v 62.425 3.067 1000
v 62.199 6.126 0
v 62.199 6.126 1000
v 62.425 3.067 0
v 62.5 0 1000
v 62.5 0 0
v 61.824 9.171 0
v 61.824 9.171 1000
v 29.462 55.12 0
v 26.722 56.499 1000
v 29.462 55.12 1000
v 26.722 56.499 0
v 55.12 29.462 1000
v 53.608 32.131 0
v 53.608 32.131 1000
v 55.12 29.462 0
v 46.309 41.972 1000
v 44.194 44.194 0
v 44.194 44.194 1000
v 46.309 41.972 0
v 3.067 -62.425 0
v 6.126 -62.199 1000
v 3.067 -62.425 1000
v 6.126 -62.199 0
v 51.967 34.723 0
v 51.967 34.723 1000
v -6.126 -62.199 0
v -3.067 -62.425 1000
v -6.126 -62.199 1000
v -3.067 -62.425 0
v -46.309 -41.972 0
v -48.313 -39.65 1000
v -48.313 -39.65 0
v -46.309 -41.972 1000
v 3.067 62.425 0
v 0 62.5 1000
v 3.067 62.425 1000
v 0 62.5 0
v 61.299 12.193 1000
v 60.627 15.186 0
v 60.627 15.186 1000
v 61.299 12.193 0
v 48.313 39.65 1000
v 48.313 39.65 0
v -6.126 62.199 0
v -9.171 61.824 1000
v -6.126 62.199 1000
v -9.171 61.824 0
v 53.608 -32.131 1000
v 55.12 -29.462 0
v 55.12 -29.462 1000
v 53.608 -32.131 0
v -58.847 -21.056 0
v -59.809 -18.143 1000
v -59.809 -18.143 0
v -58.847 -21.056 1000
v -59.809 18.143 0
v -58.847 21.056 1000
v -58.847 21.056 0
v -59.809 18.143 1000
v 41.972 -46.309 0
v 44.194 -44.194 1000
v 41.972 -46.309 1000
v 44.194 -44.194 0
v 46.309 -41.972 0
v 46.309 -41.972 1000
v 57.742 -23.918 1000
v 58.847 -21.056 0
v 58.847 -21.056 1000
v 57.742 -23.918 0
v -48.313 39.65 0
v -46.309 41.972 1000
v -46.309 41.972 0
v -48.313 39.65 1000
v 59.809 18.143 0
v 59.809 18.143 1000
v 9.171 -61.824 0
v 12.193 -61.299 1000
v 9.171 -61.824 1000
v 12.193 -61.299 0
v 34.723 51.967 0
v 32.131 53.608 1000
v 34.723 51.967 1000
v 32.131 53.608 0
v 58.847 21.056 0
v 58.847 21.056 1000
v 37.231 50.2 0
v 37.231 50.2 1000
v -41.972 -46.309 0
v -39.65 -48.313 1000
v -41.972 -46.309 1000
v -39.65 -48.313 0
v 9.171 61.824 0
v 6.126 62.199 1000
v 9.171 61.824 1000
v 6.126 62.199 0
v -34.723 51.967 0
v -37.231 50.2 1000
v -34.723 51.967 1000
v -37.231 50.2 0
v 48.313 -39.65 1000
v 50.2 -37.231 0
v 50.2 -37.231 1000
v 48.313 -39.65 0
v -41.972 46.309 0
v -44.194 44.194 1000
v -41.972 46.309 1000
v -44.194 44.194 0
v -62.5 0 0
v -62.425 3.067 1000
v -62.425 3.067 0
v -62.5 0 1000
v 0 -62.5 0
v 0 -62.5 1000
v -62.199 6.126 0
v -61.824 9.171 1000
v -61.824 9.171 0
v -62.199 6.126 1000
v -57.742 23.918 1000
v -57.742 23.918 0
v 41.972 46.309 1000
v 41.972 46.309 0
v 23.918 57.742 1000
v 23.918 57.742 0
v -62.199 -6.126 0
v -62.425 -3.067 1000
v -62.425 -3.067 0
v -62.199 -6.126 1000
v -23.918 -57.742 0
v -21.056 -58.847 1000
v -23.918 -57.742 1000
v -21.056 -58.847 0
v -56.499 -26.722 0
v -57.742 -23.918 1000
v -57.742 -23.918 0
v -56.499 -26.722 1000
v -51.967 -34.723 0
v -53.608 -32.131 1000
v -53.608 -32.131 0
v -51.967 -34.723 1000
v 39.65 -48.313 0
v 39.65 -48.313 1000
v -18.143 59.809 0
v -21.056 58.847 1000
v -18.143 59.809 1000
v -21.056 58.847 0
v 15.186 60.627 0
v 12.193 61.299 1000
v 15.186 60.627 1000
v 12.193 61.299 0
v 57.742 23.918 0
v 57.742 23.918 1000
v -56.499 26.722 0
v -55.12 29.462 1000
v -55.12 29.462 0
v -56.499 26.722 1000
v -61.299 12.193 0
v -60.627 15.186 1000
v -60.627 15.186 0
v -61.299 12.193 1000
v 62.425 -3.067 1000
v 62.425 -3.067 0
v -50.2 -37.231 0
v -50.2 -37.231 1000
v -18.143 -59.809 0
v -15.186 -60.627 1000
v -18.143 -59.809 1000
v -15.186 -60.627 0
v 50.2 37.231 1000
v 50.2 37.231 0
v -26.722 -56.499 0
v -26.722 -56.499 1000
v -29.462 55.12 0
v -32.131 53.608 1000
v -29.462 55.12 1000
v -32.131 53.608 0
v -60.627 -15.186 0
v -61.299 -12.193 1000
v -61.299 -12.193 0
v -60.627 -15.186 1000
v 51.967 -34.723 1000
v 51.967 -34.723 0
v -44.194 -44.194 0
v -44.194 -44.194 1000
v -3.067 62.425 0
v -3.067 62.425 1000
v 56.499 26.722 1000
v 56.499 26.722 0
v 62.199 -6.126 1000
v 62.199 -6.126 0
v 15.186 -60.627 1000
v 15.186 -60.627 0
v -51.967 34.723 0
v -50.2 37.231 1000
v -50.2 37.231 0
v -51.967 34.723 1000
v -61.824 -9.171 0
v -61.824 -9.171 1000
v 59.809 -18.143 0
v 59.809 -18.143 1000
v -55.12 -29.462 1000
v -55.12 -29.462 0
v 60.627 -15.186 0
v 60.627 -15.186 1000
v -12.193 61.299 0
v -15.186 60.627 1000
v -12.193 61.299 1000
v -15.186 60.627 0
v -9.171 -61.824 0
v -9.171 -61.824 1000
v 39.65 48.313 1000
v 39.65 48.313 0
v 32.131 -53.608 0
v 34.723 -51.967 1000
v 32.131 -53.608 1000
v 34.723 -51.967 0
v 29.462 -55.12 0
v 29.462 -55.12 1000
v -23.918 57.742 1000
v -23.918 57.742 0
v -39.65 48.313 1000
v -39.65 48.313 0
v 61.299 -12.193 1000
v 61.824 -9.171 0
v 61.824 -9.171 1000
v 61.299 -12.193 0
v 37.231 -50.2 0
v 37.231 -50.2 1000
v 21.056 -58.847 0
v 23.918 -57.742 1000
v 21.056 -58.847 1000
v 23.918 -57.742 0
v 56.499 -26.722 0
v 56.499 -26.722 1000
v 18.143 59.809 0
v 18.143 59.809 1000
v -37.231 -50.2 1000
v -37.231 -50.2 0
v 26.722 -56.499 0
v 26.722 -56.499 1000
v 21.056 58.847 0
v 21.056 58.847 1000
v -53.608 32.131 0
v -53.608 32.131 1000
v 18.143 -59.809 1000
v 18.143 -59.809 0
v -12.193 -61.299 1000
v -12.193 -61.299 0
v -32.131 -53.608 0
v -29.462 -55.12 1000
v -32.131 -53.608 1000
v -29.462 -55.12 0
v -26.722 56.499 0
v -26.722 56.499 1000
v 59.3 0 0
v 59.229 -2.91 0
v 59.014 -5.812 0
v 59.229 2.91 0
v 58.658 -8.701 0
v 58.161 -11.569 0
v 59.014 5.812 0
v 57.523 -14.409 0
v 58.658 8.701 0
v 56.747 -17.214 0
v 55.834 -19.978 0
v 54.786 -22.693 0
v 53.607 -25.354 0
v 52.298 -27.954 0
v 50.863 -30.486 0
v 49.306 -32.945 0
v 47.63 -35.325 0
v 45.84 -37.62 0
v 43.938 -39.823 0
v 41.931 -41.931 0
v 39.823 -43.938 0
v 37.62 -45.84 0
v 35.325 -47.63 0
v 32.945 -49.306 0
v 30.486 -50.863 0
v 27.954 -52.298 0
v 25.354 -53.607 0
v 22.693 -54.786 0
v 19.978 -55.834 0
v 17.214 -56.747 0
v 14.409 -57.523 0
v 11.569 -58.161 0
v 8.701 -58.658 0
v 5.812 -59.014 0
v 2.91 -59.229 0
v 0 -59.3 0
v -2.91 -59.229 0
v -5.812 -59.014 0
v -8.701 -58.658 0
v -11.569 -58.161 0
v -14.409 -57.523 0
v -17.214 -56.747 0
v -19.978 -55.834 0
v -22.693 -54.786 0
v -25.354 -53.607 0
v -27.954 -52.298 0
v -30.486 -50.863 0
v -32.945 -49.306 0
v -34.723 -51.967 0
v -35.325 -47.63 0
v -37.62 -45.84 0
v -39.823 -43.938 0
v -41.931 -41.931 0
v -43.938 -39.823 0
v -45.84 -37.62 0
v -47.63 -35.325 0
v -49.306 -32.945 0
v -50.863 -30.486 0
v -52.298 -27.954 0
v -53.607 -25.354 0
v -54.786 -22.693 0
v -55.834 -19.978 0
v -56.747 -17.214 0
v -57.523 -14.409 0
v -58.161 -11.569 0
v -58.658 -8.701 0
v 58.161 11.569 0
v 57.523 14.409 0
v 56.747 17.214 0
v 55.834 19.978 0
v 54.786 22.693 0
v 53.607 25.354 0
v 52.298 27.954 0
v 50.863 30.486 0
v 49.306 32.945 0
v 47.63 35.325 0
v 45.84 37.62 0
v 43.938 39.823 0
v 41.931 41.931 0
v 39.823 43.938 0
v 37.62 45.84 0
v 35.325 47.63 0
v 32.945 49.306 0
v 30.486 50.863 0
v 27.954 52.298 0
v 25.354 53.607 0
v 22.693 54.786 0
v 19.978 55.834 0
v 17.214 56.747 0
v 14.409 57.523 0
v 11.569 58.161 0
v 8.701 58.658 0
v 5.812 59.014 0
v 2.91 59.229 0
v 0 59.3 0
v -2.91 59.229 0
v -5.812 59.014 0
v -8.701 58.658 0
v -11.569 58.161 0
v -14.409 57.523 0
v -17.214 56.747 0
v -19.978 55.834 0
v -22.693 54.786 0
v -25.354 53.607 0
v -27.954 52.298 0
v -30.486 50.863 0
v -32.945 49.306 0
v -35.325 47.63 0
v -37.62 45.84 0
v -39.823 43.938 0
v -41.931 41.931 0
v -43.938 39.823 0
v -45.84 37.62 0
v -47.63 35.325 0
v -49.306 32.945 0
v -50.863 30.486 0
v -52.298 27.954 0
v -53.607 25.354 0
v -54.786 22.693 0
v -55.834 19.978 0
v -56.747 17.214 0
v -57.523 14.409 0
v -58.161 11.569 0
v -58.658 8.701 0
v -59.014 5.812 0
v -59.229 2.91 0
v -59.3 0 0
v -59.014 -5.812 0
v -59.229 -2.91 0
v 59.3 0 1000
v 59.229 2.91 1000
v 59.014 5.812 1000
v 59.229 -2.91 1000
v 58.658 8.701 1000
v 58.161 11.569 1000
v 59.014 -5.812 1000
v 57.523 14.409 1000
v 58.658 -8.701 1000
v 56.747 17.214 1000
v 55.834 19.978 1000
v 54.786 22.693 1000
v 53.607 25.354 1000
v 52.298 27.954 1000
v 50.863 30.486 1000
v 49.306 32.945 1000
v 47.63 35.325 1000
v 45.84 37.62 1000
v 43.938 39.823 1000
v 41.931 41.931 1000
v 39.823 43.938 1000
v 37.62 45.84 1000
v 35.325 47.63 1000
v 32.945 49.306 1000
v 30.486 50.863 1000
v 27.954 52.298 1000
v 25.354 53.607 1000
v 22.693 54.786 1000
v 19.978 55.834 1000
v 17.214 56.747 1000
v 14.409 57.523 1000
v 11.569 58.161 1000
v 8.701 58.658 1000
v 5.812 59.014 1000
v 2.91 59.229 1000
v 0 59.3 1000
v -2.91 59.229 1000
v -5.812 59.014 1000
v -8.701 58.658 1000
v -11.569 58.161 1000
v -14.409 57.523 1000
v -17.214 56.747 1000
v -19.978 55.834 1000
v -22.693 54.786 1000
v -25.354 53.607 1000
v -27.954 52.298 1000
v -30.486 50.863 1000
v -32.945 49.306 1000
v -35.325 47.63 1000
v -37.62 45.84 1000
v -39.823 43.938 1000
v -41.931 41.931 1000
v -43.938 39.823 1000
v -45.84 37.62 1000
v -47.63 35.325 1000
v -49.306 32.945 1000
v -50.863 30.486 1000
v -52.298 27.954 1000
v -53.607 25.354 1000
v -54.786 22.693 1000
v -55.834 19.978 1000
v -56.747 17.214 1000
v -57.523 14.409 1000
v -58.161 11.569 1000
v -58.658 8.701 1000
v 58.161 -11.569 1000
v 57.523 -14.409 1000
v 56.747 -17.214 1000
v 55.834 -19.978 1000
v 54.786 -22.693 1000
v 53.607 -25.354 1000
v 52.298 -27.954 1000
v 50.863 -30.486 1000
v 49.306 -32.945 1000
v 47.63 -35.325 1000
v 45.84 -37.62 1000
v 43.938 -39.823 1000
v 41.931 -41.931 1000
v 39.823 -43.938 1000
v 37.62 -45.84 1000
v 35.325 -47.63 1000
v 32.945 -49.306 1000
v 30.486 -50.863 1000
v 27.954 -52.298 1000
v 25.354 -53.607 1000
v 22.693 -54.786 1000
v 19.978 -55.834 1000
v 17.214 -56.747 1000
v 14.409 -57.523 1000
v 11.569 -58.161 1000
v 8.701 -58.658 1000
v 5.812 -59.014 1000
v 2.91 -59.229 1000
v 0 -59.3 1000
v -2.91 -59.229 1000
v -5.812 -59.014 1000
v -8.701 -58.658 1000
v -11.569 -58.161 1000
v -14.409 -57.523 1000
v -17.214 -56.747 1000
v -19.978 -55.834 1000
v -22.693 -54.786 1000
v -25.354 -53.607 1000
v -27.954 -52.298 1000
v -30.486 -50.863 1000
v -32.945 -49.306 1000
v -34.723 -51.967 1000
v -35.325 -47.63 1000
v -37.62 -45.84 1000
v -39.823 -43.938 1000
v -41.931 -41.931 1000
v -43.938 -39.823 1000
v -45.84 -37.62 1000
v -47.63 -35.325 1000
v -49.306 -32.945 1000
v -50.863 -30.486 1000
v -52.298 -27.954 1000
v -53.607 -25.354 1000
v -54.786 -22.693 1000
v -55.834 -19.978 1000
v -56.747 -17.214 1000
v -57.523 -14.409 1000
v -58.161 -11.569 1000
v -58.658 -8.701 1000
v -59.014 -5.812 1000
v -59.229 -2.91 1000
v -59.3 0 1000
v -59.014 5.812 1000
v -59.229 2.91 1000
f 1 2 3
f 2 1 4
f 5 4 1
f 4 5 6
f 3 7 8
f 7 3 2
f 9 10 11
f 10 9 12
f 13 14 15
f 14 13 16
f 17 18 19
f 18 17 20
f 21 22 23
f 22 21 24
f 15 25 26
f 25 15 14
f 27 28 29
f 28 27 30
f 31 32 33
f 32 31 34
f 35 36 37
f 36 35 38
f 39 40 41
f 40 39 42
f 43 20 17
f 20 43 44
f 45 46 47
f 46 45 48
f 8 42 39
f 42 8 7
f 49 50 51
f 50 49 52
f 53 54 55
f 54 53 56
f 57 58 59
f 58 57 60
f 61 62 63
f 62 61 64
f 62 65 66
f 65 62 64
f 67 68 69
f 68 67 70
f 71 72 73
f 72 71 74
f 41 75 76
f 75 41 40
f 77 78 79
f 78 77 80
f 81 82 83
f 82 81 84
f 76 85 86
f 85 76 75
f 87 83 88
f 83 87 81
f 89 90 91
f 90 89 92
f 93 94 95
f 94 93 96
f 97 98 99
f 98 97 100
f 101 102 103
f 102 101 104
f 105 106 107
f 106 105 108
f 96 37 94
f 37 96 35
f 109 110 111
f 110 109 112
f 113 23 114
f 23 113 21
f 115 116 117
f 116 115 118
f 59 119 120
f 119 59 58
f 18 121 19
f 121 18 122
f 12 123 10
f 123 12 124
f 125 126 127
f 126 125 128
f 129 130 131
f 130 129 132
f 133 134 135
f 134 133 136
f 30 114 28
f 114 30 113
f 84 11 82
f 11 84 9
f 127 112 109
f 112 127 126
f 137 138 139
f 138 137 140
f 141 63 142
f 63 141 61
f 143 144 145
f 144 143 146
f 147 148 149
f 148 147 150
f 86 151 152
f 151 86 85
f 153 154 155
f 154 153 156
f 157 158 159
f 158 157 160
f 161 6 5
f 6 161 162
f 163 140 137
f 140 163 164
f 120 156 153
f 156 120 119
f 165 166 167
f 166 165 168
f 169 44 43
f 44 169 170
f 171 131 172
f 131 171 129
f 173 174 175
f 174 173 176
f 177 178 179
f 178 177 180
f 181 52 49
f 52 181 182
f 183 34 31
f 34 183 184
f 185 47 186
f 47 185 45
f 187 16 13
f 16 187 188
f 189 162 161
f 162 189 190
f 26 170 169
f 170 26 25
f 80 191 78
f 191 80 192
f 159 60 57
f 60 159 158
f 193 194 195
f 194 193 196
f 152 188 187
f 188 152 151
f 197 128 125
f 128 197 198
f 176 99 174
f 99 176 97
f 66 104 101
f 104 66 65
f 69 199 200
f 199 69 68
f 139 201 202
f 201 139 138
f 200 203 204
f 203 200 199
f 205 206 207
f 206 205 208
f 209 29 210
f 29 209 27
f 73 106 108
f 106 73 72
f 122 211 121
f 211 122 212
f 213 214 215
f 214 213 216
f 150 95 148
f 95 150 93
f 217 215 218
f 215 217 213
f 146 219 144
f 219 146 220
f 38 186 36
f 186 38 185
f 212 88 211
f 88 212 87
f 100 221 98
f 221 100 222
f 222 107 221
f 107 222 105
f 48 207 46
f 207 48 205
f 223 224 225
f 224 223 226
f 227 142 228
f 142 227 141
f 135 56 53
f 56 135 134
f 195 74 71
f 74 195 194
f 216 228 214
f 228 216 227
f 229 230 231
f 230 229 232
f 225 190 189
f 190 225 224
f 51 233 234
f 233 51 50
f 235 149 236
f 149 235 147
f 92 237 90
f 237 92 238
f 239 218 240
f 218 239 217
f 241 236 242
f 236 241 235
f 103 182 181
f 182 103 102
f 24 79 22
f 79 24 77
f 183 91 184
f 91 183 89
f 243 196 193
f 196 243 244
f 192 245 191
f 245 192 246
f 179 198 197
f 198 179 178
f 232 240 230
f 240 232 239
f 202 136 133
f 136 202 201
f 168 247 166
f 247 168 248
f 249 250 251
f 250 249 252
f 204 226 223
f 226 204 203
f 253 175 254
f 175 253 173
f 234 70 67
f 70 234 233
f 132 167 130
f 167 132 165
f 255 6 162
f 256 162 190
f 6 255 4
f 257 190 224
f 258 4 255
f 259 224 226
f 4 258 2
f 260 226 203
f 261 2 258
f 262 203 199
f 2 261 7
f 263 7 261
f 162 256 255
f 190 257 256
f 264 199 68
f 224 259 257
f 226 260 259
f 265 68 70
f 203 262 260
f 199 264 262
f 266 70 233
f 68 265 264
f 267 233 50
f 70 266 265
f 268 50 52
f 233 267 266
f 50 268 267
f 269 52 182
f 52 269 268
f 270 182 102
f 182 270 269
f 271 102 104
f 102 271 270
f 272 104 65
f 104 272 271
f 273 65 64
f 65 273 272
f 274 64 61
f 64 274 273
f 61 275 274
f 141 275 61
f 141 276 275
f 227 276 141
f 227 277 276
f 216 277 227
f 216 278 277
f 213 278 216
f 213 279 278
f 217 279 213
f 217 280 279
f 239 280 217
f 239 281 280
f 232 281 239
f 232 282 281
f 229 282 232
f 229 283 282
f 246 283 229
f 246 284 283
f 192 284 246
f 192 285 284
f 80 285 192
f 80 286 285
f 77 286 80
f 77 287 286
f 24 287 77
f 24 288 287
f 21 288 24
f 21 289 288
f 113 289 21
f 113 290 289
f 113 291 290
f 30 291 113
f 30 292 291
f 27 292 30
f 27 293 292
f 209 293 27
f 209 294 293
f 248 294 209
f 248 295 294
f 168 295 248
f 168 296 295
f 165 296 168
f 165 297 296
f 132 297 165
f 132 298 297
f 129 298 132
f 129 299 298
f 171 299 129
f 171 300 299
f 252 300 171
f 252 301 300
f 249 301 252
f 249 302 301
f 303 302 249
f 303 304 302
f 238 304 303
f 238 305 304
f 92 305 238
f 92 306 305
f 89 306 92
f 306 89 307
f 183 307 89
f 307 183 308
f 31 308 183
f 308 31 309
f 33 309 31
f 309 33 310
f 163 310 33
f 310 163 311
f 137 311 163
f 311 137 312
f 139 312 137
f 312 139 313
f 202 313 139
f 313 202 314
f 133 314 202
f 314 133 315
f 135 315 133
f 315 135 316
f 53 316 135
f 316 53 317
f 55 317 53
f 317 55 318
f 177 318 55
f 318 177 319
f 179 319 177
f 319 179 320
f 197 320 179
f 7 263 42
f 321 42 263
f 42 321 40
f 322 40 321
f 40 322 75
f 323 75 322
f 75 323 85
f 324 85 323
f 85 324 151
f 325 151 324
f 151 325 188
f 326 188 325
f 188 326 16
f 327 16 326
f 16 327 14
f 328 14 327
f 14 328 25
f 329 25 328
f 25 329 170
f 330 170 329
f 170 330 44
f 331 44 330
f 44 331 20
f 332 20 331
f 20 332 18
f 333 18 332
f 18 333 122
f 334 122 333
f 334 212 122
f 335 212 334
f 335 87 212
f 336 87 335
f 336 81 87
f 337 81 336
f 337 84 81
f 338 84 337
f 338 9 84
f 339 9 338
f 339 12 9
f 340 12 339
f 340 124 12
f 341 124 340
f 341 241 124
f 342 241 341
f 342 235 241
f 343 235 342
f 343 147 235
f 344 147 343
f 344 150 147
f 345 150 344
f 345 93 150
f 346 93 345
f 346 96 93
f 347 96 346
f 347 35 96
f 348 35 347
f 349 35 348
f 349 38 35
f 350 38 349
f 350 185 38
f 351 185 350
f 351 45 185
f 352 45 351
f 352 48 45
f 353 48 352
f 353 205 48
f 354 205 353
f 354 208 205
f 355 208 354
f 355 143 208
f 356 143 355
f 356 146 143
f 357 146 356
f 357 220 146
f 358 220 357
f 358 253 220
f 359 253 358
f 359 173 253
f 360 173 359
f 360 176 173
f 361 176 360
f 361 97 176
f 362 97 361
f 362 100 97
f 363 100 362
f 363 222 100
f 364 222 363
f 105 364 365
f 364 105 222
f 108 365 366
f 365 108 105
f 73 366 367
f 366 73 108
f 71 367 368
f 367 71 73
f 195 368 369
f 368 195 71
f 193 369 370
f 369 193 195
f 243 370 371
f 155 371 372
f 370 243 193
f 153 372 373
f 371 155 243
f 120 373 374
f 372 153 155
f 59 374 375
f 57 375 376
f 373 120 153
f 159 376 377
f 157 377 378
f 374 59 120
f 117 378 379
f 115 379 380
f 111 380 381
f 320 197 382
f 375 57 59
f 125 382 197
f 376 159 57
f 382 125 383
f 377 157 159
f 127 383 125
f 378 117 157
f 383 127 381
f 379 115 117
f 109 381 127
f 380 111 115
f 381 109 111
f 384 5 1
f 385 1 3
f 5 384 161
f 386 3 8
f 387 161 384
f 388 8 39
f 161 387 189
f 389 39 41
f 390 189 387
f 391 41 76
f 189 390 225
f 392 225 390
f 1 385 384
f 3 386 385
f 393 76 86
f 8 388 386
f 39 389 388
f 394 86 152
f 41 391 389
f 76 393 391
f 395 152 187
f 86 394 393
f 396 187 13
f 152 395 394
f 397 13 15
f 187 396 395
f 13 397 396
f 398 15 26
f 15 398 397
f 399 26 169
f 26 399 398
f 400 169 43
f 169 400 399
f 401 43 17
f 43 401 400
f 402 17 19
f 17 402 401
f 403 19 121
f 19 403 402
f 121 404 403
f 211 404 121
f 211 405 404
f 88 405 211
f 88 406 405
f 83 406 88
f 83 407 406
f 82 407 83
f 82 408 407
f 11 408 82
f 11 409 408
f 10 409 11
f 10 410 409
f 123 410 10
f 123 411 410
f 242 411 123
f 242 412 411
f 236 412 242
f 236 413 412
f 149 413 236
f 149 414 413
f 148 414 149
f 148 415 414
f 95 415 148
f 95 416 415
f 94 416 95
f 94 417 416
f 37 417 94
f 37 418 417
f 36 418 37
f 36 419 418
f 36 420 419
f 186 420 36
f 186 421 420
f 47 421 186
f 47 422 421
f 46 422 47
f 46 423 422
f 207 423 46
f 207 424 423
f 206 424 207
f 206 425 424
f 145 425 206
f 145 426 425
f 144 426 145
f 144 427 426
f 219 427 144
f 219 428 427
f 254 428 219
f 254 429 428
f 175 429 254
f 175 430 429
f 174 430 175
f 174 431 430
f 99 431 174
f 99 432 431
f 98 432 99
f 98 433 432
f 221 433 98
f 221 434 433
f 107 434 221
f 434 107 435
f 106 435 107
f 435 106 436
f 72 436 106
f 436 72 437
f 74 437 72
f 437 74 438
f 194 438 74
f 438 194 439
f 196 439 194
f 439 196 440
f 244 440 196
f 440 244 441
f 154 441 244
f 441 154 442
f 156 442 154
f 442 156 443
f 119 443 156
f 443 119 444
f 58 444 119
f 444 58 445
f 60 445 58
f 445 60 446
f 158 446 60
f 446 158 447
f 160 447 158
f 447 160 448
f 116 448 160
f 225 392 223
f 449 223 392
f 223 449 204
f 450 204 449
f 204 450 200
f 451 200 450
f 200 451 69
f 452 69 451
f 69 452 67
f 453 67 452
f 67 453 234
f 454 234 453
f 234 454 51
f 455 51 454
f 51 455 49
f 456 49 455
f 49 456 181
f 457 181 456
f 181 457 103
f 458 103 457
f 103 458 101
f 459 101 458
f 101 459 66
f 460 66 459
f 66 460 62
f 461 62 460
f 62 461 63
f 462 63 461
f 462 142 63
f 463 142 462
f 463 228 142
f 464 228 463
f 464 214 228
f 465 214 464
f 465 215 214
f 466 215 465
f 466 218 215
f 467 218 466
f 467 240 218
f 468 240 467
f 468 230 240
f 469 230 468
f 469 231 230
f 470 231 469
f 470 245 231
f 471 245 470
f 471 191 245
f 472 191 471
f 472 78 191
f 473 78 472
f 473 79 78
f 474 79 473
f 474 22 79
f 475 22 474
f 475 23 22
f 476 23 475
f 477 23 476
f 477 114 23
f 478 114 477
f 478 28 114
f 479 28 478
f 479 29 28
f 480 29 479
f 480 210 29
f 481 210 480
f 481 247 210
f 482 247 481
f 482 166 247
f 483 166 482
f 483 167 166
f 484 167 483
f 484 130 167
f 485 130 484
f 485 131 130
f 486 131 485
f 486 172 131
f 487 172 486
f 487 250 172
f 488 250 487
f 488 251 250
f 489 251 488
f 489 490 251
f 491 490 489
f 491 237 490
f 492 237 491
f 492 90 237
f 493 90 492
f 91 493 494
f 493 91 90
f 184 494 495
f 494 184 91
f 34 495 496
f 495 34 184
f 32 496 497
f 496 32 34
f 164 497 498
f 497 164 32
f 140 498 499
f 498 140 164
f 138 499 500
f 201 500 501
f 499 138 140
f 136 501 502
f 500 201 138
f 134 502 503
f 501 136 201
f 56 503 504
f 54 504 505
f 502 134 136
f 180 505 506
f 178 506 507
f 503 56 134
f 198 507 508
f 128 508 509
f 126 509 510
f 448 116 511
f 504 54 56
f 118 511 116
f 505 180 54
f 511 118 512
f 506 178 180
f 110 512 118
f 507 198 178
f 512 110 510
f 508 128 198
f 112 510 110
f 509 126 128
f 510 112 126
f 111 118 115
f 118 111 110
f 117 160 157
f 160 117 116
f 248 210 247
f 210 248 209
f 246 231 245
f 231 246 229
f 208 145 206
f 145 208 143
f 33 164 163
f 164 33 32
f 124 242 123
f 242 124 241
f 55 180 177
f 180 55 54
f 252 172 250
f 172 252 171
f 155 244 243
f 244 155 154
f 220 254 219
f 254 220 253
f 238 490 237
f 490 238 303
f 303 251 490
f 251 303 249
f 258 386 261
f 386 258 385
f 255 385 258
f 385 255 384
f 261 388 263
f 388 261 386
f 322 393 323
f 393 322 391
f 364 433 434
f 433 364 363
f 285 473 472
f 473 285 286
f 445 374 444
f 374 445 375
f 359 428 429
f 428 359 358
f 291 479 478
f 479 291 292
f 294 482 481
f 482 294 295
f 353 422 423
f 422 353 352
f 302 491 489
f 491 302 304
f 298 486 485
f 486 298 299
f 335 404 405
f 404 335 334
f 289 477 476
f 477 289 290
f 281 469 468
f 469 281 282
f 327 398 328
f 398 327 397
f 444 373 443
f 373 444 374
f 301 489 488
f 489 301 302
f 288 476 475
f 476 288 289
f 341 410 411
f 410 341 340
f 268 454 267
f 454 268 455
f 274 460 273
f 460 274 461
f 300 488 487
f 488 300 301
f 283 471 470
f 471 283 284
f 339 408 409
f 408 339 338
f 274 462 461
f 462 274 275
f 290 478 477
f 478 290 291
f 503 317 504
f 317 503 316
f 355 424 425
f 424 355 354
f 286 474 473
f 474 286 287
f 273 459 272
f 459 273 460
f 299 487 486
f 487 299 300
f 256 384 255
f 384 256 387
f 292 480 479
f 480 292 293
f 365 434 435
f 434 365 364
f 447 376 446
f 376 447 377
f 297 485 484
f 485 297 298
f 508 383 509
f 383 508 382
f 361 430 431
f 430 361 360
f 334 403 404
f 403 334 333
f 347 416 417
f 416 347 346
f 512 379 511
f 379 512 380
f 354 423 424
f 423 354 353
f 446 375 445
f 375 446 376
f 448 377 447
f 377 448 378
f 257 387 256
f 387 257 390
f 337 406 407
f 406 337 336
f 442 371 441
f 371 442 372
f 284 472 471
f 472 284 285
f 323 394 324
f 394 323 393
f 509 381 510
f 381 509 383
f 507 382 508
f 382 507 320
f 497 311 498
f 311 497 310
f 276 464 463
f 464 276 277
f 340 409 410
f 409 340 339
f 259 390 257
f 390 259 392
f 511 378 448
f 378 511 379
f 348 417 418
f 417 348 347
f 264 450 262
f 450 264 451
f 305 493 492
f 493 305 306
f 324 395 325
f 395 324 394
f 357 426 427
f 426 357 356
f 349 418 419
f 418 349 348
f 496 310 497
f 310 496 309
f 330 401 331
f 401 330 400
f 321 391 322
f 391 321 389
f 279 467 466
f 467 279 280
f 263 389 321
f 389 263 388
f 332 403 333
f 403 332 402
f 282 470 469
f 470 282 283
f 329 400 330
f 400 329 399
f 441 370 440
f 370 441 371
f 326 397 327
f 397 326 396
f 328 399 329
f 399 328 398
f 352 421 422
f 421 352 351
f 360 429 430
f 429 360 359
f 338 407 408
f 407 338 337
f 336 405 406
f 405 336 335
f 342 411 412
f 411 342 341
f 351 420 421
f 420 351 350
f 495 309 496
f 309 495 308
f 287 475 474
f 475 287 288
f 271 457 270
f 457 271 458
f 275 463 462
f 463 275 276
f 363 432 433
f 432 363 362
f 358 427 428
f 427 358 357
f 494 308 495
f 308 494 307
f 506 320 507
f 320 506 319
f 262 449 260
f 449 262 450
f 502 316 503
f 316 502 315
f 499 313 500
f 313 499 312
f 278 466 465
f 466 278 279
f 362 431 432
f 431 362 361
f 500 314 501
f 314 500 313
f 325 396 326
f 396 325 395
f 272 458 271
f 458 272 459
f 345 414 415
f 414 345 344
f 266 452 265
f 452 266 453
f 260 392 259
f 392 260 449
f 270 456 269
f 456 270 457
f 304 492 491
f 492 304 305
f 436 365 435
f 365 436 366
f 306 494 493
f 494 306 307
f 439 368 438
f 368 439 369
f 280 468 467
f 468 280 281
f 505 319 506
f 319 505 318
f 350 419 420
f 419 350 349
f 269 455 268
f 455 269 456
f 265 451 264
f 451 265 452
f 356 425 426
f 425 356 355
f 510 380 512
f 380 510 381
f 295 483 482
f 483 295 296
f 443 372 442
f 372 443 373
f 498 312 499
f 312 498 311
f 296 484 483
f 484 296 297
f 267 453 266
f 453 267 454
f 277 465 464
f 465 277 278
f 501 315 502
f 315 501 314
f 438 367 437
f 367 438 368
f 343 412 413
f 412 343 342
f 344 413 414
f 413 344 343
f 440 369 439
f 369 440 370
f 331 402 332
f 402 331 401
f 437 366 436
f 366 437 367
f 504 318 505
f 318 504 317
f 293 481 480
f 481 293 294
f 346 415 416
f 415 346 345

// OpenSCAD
$fn = 128;

// HT pipe parameters (approximate for HT 125)
pipe_length = 1000;      // mm
outer_diameter = 125;    // mm
wall_thickness = 3.2;    // mm (typical; adjust if needed)

inner_diameter = outer_diameter - 2*wall_thickness;

module ht_pipe(od, id, len) {
    difference() {
        cylinder(h = len, d = od, center = false);
        translate([0,0,-0.5])
            cylinder(h = len + 1, d = id, center = false);
    }
}

ht_pipe(outer_diameter, inner_diameter, pipe_length);
